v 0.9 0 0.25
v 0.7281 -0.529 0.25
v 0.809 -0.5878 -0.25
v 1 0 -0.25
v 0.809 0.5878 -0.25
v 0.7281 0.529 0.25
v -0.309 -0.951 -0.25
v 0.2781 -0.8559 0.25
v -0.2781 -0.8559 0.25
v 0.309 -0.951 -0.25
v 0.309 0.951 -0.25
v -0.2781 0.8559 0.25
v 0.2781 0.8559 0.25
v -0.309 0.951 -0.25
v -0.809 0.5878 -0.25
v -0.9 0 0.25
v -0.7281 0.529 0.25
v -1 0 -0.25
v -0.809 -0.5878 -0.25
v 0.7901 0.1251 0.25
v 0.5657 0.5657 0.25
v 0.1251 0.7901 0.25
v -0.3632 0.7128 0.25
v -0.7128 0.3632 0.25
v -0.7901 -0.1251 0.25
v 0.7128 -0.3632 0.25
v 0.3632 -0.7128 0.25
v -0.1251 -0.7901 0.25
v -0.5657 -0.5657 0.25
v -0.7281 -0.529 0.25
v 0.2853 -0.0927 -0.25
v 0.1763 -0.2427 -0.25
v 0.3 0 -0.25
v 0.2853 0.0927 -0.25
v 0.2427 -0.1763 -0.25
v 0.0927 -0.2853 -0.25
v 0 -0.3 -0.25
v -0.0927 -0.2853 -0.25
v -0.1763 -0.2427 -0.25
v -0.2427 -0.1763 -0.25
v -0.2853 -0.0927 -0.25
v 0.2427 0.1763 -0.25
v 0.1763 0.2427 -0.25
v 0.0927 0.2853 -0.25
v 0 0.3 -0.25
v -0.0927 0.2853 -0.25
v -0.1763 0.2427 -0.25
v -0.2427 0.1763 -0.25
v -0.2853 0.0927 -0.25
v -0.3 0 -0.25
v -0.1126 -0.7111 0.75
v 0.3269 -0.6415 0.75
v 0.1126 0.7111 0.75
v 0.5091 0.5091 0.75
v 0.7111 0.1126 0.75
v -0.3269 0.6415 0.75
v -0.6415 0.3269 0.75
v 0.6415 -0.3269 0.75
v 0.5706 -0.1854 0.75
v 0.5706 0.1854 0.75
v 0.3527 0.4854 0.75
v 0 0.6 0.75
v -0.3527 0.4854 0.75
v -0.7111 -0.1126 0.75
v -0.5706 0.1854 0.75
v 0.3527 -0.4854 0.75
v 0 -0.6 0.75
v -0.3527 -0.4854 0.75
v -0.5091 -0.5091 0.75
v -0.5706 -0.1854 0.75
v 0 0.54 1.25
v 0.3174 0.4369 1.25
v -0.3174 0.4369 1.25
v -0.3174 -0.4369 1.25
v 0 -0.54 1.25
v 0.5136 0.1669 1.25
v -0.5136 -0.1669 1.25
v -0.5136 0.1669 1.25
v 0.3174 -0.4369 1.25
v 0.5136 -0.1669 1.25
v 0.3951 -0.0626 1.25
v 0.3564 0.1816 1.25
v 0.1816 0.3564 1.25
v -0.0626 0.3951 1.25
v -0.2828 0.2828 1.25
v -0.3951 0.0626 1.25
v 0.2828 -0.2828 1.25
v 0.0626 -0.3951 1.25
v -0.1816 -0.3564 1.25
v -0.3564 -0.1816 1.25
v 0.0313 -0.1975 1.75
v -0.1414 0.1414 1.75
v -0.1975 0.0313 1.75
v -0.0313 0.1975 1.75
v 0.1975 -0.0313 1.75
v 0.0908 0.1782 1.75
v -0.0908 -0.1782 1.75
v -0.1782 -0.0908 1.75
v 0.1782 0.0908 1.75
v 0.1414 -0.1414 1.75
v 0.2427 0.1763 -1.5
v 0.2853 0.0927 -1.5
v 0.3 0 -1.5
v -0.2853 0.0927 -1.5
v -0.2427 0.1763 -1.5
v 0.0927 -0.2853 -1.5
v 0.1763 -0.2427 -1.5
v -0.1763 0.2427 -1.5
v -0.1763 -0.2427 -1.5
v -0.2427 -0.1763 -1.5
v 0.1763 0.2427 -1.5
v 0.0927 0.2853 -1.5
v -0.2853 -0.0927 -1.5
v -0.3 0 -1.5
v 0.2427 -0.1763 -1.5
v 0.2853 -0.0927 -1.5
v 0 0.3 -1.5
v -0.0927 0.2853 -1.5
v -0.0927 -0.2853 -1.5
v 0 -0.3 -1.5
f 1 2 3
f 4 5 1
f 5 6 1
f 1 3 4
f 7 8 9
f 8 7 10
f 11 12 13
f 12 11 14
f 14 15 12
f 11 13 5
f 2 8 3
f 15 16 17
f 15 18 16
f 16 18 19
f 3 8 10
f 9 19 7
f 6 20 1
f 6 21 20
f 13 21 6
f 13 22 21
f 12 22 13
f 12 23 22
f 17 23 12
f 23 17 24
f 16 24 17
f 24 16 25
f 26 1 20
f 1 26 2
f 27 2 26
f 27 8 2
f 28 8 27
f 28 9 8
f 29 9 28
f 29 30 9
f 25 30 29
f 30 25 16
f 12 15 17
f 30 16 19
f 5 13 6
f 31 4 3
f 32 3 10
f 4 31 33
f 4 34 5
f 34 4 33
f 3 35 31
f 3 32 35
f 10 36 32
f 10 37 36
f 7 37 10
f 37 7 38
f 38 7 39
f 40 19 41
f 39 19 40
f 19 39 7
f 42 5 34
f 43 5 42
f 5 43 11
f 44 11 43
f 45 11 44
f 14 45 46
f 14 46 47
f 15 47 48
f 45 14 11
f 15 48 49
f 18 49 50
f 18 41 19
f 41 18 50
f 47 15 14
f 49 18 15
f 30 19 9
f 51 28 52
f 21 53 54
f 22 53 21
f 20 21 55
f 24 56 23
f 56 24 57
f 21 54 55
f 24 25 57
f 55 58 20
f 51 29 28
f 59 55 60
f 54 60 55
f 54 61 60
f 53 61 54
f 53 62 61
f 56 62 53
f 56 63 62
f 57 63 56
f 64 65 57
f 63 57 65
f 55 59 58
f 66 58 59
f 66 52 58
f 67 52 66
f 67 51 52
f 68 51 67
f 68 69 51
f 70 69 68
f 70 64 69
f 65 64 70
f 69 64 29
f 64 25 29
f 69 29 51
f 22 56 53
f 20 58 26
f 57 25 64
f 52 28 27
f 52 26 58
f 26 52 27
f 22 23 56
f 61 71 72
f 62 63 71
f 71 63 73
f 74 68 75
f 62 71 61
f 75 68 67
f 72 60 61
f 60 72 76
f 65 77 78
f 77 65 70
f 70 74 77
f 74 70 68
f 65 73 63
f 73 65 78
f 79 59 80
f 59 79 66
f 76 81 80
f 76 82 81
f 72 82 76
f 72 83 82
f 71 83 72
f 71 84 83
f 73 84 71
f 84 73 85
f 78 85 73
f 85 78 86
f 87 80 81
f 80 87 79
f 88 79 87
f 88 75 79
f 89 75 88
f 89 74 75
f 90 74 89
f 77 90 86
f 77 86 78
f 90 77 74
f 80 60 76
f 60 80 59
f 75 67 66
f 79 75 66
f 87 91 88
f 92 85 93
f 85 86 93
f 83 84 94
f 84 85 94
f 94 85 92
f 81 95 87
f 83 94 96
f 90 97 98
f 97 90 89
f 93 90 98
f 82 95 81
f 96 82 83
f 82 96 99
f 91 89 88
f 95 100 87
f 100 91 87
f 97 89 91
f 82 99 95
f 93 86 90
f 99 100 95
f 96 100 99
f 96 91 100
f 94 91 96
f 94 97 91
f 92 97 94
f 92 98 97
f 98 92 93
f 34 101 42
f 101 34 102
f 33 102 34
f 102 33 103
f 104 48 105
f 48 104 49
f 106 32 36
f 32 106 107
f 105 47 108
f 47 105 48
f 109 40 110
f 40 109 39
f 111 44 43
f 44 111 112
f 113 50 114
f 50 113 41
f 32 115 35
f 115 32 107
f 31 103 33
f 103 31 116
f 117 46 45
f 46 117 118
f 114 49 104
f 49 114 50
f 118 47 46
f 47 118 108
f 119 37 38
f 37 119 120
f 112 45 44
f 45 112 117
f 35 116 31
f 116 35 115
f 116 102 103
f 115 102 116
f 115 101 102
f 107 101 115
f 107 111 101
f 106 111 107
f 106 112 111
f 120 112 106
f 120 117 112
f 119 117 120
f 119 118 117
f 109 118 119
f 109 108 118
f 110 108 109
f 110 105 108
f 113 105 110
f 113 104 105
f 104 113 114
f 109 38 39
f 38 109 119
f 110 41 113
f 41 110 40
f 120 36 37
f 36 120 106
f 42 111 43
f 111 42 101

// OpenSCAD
module tree_01(){

    module regular_polygon(order = 6, r=1){
         angles=[ for (i = [0:order-1]) i*(360/order) ];
         coords=[ for (th=angles) [r*cos(th), r*sin(th)] ];
         polygon(coords);
    }
    
    color("green"){
    linear_extrude(height= 0.5, center = true, scale = 0.9) 
    regular_polygon(order = 10);
    
    translate([0,0,0.5])
    rotate([0,0,45])
    linear_extrude(height= 0.5, center = true, scale = 0.9)  
    regular_polygon(order = 10, r = 0.8);
    
    
    translate([0,0,1])
    rotate([0,0,90])
    linear_extrude(height= 0.5, center = true, scale = 0.9) 
    regular_polygon(order = 10, r = 0.6);
    
        
    translate([0,0,1.5])
    rotate([0,0,135])
    linear_extrude(height= 0.5, center = true, scale = 0.5) 
    regular_polygon(order = 10, r = 0.4);
    }
    
    color("#da6d42")
    translate([0,0,-1.5])
    cylinder(2,0.3,0.3, $fn = 20);
       
}     

tree_01();
